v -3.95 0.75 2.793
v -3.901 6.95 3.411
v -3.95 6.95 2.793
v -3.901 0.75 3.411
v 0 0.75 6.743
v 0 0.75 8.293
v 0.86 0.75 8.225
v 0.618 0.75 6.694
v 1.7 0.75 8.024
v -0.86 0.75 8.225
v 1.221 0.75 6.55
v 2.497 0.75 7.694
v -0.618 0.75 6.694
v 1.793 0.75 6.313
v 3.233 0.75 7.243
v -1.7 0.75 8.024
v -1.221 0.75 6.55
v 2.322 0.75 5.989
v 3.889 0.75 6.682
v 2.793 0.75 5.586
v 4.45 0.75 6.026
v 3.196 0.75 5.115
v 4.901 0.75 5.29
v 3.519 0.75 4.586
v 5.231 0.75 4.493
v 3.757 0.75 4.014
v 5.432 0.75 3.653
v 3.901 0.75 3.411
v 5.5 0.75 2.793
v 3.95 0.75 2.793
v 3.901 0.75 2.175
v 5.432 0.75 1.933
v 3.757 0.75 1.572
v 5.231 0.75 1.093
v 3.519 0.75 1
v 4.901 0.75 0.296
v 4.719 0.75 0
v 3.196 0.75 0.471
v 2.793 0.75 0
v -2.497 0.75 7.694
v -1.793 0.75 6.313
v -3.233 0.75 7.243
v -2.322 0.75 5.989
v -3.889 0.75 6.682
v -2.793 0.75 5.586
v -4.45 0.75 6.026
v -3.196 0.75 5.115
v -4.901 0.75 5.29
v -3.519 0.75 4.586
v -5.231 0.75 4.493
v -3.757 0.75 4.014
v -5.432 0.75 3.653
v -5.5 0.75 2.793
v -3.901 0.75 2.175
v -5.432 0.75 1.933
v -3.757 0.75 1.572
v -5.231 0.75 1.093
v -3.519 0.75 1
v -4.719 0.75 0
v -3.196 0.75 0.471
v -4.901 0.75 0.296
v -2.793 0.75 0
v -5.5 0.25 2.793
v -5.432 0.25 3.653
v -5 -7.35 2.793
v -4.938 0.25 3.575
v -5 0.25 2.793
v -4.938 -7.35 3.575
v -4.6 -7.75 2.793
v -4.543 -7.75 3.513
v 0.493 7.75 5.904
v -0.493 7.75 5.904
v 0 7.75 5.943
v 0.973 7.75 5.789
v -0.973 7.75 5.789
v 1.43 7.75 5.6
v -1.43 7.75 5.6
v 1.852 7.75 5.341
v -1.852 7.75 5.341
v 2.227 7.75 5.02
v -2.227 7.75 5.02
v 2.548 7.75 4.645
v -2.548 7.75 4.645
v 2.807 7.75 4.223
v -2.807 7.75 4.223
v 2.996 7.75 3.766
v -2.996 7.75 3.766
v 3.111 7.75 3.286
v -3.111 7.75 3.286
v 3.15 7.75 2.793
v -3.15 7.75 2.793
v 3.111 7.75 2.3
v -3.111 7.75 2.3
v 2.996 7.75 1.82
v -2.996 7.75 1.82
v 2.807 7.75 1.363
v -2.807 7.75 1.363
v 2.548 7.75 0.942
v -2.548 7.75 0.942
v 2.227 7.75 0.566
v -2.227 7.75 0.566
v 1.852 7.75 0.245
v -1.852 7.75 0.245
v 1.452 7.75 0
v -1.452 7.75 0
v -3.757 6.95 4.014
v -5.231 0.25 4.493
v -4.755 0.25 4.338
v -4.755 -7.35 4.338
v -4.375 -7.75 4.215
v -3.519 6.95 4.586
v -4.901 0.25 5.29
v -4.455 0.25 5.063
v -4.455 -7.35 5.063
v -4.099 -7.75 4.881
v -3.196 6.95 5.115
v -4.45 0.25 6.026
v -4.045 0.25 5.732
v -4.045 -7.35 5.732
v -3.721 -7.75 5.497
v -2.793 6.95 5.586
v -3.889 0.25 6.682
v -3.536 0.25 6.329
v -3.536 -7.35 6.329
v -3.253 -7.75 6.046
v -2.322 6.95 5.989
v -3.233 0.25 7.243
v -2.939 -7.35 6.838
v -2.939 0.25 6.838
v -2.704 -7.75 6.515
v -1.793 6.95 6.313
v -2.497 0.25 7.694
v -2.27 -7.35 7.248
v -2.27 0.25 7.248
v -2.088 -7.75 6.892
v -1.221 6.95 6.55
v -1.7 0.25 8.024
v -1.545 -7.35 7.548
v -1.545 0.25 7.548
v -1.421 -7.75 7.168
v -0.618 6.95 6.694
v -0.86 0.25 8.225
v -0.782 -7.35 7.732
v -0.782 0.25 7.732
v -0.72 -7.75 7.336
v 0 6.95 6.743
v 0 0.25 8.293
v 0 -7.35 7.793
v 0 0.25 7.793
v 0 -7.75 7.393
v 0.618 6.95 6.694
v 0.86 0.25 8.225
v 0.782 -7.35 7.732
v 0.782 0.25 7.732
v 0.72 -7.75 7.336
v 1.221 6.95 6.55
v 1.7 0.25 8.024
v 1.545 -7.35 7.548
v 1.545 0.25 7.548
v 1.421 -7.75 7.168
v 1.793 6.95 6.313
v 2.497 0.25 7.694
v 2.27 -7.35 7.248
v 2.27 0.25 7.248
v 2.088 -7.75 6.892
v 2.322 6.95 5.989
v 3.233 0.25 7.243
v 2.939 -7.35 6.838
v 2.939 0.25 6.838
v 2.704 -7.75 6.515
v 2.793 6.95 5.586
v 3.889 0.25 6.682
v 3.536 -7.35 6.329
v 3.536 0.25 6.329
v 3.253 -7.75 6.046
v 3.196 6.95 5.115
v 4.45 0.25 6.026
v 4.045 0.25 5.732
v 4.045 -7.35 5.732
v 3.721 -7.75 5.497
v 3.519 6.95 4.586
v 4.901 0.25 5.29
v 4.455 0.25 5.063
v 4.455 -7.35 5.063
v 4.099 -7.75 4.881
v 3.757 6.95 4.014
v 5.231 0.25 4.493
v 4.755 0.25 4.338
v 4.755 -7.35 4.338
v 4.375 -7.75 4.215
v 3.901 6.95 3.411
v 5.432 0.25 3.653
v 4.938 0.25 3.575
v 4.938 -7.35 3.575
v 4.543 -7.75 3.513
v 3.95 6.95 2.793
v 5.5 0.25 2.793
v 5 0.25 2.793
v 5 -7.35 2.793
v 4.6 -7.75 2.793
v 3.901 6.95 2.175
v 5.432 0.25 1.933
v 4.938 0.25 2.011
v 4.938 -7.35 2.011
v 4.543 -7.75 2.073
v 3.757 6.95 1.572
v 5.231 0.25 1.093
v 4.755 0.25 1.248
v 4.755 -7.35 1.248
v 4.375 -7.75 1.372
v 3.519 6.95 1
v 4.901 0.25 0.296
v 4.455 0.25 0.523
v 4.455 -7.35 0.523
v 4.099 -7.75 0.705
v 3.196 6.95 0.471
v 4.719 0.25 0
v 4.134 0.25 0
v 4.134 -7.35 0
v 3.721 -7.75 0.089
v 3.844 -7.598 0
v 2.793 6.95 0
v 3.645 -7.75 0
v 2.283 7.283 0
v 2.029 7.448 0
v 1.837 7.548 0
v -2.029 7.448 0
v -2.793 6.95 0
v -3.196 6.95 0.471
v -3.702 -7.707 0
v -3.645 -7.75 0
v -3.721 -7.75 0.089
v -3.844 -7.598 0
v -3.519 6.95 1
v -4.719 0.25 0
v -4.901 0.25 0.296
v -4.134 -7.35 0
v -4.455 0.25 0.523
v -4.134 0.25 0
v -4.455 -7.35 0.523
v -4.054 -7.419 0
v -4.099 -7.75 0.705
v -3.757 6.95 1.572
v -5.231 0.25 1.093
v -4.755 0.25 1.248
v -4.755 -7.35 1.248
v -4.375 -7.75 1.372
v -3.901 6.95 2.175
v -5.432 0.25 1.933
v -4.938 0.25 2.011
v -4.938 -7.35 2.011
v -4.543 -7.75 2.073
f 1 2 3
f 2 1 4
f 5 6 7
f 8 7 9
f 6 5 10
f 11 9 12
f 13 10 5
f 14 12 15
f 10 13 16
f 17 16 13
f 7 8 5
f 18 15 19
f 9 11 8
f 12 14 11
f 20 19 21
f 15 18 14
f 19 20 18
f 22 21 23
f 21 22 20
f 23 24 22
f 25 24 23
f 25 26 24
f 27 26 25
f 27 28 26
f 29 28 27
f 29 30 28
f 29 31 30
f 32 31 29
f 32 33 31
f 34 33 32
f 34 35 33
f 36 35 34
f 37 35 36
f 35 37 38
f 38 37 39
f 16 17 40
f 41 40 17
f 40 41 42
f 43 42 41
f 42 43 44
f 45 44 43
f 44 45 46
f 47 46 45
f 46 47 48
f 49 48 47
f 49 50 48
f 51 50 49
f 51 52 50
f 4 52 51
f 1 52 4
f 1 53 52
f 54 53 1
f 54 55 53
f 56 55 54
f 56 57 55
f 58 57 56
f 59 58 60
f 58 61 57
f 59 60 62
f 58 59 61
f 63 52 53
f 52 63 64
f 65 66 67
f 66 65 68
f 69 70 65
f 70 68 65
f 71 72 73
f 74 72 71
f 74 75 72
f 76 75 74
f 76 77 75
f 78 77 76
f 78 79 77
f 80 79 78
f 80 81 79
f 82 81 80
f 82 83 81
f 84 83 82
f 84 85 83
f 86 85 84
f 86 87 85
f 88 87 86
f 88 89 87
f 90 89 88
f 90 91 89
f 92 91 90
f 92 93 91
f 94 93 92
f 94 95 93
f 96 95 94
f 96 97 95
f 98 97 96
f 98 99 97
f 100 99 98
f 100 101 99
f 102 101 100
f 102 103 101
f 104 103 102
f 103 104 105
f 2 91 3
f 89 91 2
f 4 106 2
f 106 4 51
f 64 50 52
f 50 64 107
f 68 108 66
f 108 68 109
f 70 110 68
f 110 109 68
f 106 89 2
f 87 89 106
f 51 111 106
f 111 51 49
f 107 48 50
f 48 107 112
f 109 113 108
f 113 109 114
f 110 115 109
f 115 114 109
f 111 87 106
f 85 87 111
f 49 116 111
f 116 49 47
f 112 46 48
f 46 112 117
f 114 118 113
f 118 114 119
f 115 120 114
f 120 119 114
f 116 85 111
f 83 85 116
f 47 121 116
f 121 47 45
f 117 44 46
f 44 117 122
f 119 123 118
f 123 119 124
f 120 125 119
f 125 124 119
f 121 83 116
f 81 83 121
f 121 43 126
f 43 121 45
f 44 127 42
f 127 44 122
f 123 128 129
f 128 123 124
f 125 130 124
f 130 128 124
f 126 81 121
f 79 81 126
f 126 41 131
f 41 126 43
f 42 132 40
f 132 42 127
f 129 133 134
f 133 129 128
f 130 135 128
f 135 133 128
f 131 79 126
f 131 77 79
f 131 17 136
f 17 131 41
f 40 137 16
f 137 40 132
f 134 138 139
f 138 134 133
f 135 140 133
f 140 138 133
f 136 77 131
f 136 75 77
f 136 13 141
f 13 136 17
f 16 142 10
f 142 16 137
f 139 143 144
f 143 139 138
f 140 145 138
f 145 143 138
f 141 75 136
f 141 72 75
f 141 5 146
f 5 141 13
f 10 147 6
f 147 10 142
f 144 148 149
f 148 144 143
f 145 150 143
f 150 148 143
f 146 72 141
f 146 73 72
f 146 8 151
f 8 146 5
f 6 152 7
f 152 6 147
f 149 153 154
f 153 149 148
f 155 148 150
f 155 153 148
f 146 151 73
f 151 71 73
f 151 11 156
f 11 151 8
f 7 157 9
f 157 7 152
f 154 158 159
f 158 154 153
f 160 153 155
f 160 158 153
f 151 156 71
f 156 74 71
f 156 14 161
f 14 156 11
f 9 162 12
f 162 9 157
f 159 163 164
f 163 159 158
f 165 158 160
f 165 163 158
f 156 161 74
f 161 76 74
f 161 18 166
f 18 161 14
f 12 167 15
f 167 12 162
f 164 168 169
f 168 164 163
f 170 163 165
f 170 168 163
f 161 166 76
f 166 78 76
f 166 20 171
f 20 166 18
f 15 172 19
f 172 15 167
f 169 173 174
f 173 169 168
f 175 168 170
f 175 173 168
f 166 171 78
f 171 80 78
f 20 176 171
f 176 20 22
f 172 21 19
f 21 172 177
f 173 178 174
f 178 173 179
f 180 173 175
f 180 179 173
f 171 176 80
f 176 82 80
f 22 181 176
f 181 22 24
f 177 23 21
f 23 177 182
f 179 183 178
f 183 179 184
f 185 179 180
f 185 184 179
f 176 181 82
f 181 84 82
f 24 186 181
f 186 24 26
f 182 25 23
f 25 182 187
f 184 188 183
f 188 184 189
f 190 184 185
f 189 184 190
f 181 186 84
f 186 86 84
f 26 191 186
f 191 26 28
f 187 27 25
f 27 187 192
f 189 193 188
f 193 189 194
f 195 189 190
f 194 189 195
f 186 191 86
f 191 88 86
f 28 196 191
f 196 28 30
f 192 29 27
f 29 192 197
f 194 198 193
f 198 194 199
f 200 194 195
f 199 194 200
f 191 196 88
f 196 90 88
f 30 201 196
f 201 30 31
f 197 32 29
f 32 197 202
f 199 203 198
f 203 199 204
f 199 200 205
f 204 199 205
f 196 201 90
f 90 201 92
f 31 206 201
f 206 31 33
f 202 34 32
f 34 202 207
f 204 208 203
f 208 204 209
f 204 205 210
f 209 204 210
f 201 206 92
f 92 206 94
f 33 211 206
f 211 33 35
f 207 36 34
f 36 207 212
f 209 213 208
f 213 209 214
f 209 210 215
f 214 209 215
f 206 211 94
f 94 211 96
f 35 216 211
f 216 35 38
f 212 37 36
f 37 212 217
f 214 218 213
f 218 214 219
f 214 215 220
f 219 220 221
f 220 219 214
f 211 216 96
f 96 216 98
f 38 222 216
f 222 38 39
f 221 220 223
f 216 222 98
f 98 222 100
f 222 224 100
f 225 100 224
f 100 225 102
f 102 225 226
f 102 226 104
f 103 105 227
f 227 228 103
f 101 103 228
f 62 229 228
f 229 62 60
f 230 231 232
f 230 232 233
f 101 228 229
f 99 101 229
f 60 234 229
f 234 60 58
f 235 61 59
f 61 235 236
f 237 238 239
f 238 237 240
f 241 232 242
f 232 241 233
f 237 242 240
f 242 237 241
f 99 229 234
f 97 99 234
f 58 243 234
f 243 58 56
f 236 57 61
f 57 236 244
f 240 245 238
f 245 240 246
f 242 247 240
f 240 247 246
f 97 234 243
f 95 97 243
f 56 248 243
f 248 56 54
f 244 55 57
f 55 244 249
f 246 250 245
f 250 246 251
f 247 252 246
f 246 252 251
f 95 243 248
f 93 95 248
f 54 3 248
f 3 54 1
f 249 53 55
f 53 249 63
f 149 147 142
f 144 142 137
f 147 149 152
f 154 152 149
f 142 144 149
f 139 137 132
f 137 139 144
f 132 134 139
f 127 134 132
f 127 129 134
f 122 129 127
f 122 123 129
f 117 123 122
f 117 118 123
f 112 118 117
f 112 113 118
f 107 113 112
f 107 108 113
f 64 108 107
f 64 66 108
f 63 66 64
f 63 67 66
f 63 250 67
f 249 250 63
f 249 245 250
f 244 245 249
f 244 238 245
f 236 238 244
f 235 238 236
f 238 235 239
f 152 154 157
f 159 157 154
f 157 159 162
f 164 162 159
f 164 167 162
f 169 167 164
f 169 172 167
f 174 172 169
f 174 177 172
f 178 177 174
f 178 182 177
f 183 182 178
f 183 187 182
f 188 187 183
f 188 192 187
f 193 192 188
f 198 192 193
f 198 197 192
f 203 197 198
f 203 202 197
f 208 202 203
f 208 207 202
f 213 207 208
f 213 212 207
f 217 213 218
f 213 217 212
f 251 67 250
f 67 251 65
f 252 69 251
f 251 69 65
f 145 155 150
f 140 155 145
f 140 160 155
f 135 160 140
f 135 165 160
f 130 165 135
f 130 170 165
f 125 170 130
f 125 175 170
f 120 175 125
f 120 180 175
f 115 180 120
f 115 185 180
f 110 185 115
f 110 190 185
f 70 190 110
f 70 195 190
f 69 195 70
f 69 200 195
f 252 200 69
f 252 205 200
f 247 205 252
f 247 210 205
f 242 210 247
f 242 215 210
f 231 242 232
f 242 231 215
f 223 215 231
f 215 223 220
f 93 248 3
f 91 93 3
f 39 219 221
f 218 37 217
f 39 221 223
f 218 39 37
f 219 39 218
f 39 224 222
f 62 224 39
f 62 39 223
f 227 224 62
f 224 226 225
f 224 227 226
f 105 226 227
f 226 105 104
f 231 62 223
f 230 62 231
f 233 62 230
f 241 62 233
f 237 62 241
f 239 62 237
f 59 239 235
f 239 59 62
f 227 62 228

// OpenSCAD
include <../lib/filament-spool-roller-lib.scad>;
$fn = 40;
peg_end();
